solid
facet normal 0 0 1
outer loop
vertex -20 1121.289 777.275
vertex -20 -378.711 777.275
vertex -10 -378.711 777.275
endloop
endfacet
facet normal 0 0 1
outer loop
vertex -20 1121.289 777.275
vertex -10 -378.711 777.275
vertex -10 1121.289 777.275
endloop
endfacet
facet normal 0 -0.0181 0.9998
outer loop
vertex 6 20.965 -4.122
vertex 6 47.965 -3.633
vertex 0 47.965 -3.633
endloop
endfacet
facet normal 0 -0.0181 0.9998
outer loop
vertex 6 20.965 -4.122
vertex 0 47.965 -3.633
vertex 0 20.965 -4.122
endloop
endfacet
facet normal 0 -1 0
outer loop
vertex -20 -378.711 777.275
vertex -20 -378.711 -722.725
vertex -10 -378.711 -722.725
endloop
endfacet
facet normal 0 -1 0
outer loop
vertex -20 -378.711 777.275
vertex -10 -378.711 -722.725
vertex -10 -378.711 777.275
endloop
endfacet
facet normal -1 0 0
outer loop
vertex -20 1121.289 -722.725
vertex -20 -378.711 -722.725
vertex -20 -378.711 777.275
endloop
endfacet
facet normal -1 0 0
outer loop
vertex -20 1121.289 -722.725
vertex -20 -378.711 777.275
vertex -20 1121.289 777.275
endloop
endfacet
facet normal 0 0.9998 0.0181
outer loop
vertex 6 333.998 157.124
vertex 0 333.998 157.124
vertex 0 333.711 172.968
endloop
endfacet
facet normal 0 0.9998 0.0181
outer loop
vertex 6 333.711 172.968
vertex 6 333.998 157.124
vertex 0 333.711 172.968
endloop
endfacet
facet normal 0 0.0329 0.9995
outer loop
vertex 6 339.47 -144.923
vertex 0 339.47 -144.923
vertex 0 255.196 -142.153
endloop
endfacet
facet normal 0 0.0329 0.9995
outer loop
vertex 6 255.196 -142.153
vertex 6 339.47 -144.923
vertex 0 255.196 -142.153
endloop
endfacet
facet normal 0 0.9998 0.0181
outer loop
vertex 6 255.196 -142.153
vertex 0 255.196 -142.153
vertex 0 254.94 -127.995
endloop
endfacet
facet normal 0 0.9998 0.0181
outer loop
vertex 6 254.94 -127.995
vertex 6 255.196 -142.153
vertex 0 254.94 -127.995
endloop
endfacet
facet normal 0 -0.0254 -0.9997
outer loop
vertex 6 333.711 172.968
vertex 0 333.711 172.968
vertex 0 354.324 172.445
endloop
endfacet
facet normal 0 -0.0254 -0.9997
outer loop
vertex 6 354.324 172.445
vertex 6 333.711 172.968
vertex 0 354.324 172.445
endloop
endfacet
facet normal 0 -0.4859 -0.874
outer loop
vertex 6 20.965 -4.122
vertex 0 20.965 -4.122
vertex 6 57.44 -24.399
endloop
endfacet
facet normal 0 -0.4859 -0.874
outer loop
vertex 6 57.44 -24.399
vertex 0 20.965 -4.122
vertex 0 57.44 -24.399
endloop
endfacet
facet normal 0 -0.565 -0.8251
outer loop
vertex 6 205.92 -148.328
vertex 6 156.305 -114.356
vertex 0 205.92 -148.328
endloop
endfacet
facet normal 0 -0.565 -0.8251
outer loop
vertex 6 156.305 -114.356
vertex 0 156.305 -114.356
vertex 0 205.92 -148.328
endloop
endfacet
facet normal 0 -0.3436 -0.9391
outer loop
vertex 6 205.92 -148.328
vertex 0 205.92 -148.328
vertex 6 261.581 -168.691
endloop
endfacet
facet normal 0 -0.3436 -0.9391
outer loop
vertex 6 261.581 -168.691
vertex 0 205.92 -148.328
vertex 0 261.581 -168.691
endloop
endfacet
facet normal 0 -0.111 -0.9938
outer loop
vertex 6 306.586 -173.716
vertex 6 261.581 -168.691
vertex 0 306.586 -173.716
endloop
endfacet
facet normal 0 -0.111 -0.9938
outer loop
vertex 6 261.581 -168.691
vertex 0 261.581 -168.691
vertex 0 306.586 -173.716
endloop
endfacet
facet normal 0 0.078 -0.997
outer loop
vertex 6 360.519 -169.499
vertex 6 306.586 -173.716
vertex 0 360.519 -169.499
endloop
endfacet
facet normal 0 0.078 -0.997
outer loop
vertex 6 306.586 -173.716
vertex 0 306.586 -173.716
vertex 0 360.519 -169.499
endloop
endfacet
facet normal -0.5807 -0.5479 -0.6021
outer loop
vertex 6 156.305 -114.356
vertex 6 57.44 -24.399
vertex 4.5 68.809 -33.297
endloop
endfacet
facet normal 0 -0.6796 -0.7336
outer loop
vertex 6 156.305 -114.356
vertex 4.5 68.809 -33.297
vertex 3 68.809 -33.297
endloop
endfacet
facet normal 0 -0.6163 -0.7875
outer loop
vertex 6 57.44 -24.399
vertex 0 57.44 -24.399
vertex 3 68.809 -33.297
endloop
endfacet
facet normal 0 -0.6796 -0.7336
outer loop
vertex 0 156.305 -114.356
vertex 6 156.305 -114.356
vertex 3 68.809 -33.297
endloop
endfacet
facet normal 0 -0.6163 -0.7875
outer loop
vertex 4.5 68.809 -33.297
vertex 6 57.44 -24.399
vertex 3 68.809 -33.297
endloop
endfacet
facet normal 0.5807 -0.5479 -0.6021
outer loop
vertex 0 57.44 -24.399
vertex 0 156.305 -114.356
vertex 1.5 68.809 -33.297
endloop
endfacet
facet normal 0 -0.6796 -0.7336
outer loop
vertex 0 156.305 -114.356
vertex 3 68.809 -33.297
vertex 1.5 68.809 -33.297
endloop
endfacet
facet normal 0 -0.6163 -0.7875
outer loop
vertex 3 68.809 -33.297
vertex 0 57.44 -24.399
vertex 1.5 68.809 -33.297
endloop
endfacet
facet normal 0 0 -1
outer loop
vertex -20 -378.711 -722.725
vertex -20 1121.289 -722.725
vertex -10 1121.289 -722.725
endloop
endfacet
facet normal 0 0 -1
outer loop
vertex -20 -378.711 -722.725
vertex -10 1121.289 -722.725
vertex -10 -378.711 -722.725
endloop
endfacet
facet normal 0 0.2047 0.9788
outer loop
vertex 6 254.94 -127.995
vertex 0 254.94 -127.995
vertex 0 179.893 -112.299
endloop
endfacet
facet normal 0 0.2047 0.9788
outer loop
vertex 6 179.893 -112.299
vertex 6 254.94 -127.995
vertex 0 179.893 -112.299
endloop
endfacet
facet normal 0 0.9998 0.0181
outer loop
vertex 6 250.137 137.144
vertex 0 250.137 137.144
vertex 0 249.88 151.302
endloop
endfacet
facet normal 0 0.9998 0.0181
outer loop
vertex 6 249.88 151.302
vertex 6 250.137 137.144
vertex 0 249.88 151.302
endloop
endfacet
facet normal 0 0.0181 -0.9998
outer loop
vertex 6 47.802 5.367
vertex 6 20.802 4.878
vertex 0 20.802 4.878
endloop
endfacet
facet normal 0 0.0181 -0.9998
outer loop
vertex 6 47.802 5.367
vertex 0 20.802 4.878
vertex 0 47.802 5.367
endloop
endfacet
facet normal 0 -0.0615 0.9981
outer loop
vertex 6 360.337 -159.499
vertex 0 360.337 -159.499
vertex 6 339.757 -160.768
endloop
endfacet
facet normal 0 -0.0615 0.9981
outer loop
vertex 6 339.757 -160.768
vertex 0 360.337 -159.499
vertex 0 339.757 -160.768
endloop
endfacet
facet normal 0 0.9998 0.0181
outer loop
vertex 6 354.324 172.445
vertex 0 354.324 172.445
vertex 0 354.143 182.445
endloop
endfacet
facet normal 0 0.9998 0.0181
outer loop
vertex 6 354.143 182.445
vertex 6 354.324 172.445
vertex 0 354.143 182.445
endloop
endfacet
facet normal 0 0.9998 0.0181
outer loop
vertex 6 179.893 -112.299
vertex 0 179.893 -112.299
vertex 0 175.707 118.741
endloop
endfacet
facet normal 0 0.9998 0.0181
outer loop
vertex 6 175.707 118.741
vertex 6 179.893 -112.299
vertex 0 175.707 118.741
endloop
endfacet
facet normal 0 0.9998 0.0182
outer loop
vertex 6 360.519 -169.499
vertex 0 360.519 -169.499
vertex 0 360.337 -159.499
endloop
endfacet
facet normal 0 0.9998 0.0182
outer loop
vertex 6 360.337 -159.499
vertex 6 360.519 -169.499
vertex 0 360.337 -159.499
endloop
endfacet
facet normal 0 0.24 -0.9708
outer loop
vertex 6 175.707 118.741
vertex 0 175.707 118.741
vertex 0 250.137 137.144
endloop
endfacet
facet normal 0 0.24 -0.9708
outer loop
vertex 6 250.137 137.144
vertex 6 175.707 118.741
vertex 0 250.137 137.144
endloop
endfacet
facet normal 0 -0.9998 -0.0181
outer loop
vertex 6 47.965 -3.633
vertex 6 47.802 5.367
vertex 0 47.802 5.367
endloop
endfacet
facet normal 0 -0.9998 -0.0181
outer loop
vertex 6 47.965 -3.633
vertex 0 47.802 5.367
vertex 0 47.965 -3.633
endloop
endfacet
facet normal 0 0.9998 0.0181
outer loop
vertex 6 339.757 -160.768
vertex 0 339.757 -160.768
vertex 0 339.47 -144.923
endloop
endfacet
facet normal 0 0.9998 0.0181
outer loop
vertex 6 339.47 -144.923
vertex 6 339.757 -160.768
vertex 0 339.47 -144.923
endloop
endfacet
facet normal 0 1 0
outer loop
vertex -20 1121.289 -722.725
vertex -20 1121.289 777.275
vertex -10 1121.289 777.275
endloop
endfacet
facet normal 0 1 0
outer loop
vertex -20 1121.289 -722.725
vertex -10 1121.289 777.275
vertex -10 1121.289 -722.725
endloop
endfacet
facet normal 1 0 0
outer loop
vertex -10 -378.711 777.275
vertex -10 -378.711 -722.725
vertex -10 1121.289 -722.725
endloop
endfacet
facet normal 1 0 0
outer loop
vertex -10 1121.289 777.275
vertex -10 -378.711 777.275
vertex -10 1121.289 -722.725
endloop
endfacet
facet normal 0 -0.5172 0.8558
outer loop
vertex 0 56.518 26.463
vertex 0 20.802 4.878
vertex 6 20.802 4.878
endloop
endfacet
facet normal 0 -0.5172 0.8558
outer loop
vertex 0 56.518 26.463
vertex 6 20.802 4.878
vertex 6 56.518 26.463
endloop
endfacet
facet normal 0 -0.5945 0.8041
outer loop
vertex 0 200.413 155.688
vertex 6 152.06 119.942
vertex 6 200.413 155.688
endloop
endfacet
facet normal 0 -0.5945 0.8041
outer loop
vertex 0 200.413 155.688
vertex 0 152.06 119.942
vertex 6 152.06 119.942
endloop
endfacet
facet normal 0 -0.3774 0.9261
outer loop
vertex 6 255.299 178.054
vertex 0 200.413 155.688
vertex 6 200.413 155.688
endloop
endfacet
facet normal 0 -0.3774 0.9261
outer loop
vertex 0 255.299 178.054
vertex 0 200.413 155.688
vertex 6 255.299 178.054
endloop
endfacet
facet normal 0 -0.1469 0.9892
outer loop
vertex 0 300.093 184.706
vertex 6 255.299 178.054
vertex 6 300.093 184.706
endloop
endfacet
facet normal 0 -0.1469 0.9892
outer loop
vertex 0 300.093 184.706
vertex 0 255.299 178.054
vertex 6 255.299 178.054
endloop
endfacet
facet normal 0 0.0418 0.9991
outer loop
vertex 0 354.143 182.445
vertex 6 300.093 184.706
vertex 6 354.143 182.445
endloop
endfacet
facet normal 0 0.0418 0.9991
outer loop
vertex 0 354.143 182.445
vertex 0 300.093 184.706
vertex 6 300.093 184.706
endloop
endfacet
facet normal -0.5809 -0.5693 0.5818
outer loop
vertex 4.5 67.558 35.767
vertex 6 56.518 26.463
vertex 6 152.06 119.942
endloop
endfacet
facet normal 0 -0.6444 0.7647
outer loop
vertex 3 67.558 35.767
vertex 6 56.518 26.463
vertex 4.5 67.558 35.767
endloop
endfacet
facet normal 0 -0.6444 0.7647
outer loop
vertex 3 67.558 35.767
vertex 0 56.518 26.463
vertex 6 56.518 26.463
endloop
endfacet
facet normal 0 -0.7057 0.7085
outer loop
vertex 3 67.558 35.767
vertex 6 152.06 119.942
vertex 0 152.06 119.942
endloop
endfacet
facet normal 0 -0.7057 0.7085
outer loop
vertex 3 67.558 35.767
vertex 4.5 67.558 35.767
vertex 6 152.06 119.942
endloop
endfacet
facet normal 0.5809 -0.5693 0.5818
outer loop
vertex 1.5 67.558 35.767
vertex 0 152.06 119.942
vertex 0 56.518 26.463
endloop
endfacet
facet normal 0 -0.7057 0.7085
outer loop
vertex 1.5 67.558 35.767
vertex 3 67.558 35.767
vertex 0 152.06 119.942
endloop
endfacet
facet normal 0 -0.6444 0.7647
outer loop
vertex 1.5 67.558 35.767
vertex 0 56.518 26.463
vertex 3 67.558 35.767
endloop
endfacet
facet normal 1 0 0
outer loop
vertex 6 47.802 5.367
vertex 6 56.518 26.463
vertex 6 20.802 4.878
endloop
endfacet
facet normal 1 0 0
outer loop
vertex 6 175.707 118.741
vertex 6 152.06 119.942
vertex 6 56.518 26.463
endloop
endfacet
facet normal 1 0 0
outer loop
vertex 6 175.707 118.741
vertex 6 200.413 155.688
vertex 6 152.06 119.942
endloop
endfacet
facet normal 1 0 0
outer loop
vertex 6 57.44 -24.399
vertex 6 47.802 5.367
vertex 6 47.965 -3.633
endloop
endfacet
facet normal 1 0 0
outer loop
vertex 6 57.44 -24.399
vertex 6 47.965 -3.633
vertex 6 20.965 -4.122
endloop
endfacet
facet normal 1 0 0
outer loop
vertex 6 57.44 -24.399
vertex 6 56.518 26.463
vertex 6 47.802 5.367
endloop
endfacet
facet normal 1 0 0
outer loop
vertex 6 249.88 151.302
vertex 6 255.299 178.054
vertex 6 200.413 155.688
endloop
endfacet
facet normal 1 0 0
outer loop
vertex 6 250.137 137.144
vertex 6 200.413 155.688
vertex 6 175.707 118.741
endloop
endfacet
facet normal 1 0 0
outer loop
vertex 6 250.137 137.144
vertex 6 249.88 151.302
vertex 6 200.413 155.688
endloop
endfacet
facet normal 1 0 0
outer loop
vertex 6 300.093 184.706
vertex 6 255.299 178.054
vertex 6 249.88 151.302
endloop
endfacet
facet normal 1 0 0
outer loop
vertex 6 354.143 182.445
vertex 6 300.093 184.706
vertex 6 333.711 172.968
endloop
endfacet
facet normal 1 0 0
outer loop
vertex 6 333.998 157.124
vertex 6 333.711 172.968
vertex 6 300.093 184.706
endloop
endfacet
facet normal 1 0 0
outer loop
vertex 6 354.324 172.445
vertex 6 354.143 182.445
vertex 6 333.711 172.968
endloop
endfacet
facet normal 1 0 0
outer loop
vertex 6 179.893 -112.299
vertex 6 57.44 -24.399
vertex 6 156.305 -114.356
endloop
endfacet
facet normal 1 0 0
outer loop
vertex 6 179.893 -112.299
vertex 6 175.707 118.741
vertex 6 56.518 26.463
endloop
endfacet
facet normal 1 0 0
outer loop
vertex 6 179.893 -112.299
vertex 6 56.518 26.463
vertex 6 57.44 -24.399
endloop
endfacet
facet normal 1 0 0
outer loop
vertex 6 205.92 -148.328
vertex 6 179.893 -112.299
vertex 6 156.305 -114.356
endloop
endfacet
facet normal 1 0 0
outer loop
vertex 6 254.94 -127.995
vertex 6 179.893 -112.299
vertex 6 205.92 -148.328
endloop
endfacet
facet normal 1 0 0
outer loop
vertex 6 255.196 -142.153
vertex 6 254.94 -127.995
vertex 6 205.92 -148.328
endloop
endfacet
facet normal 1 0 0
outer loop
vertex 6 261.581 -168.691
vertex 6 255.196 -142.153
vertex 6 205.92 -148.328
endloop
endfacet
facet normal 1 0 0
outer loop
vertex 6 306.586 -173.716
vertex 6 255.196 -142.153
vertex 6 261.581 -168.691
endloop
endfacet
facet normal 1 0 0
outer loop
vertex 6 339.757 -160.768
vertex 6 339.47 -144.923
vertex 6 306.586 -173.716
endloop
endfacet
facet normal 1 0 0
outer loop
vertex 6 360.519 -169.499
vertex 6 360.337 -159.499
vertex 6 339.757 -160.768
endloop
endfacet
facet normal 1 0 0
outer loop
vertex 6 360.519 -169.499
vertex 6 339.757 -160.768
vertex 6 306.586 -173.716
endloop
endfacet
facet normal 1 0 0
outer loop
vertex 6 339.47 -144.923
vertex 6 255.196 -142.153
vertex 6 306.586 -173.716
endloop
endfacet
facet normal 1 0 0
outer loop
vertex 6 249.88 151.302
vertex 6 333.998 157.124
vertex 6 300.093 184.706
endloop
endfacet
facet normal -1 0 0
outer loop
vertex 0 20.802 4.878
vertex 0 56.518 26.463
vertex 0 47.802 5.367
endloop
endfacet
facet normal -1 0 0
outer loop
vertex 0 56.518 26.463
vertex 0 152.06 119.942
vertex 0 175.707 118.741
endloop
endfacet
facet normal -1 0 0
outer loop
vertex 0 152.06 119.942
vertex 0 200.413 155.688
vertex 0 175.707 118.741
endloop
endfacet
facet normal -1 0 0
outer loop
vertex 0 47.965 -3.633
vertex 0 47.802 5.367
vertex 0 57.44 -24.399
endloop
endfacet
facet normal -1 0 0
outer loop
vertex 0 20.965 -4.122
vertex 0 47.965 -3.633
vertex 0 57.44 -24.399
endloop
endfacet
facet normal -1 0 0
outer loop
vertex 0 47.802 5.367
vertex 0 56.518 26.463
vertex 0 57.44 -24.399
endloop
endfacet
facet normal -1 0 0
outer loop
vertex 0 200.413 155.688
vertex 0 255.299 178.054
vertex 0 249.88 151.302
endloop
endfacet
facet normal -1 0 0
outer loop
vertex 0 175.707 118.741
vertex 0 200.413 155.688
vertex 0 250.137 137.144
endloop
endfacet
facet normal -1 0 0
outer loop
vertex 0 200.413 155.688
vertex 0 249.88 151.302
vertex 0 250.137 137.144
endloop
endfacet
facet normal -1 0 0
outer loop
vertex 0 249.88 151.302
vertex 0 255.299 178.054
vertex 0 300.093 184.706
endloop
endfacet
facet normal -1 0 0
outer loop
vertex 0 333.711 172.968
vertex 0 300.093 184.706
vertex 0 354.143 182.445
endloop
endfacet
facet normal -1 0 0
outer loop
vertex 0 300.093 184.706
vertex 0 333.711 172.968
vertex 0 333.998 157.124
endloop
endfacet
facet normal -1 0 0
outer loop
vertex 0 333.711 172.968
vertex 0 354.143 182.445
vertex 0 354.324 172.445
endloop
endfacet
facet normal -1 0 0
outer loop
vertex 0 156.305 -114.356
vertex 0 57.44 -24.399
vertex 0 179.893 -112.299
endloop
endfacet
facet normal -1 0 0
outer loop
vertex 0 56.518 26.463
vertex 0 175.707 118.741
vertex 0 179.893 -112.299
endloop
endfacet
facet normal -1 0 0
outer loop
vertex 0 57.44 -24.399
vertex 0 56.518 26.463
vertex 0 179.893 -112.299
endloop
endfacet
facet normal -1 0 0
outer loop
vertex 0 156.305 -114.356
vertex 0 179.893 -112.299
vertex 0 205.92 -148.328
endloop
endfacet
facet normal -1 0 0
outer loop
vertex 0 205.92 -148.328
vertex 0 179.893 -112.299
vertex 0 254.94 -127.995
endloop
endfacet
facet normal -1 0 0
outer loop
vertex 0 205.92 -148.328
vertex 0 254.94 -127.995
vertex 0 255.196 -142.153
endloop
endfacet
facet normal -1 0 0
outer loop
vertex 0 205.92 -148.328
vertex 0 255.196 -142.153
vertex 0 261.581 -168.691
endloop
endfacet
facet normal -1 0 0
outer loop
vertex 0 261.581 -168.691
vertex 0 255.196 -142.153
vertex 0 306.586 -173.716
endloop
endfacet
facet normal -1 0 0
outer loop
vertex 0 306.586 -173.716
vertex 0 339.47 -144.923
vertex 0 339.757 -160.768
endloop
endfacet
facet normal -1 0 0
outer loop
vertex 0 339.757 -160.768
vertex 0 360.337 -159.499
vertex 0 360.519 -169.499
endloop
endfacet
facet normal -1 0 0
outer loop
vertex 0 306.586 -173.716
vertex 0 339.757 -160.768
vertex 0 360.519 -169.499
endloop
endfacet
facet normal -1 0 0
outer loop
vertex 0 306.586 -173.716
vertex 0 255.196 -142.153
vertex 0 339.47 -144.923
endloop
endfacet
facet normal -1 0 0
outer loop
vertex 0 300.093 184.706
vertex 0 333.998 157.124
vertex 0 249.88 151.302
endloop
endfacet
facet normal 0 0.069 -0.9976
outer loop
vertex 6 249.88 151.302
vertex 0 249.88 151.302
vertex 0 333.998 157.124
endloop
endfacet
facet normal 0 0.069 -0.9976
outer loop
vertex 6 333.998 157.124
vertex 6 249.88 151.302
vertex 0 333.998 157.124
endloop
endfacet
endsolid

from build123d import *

# Parameters (mm, degrees)
BOSS_EXTRU_2_DEPTH      = 10
BOSS_EXTRU_3_DEPTH      = 6
ENL_V_MAT_EXTRU_1_DEPTH = 6


with BuildPart() as part:
    # Esquisse3D1 → Boss.-Extru.2 (new body)
    with BuildSketch(Plane(origin=(-20, 1121.289346724, 777.274991403), x_dir=(0, -0.7071067811865476, -0.7071067811865476), z_dir=(1, 0, 0))):
        Polygon((0, 0), (1060.66017178, 1060.66017178), (2121.32034356, 0), (1060.66017178, -1060.66017178), align=None)
    extrude(amount=BOSS_EXTRU_2_DEPTH)


with BuildPart() as body_2:
    # Esquisse5 → Boss.-Extru.3 (new body)
    with BuildSketch(Plane(origin=(0, 0, 0), x_dir=(0, 0, -1), z_dir=(1, 0, 0))):
        with BuildLine():
            Line((169.498883348, 360.518503443), (159.498883348, 360.337349671))
            Line((159.498883348, 360.337349671), (160.767859708, 339.756849085))
            Line((160.767859708, 339.756849085), (144.923491305, 339.469822374))
            Line((144.923491305, 339.469822374), (142.15251138, 255.19639745))
            Line((142.15251138, 255.19639745), (127.994738238, 254.939924049))
            Line((127.994738238, 254.939924049), (112.299120278, 179.892571395))
            Line((112.299120278, 179.892571395), (-118.74094417, 175.707193466))
            Line((-118.74094417, 175.707193466), (-137.144394156, 250.13682864))
            Line((-137.144394156, 250.13682864), (-151.302167298, 249.880355239))
            Line((-151.302167298, 249.880355239), (-157.123617242, 333.998125053))
            Line((-157.123617242, 333.998125053), (-172.967985645, 333.711098342))
            Line((-172.967985645, 333.711098342), (-172.445244332, 354.32405657))
            Line((-172.445244332, 354.32405657), (-182.445244332, 354.142902797))
            add(Edge.make_bspline(
                [(0, 0), (-0.284058759, 15.680532332), (-16.394807679, 119.589146317), (-211.353019639, 127.075372846), (-182.445244332, 354.142902797)],
                knots=[0, 0, 0, 0, 0, 1, 1, 1, 1, 1], degree=4))
            add(Edge.make_bspline(
                [(0, 0), (-0.284058759, 15.680532332), (12.052667157, 120.104483055), (206.611820778, 134.64696361), (169.498883348, 360.518503443)],
                knots=[0, 0, 0, 0, 0, 1, 1, 1, 1, 1], degree=4))
        make_face()
    extrude(amount=BOSS_EXTRU_3_DEPTH)

    # Esquisse6 → Enlèv. mat.-Extru.1 (cut)
    with BuildSketch(Plane(origin=(6, 0, 0), x_dir=(0, 0, -1), z_dir=(1, 0, 0))):
        Polygon((-4.878315193, 20.802130493), (-5.367430379, 47.802130493), (3.632569621, 47.965168888), (4.121684807, 20.965168888), (117.063261114, -47.52702125), (-85.227699586, -65.220017949), align=None)
    extrude(amount=-ENL_V_MAT_EXTRU_1_DEPTH, mode=Mode.SUBTRACT)


solid = Compound([part.part, body_2.part])
